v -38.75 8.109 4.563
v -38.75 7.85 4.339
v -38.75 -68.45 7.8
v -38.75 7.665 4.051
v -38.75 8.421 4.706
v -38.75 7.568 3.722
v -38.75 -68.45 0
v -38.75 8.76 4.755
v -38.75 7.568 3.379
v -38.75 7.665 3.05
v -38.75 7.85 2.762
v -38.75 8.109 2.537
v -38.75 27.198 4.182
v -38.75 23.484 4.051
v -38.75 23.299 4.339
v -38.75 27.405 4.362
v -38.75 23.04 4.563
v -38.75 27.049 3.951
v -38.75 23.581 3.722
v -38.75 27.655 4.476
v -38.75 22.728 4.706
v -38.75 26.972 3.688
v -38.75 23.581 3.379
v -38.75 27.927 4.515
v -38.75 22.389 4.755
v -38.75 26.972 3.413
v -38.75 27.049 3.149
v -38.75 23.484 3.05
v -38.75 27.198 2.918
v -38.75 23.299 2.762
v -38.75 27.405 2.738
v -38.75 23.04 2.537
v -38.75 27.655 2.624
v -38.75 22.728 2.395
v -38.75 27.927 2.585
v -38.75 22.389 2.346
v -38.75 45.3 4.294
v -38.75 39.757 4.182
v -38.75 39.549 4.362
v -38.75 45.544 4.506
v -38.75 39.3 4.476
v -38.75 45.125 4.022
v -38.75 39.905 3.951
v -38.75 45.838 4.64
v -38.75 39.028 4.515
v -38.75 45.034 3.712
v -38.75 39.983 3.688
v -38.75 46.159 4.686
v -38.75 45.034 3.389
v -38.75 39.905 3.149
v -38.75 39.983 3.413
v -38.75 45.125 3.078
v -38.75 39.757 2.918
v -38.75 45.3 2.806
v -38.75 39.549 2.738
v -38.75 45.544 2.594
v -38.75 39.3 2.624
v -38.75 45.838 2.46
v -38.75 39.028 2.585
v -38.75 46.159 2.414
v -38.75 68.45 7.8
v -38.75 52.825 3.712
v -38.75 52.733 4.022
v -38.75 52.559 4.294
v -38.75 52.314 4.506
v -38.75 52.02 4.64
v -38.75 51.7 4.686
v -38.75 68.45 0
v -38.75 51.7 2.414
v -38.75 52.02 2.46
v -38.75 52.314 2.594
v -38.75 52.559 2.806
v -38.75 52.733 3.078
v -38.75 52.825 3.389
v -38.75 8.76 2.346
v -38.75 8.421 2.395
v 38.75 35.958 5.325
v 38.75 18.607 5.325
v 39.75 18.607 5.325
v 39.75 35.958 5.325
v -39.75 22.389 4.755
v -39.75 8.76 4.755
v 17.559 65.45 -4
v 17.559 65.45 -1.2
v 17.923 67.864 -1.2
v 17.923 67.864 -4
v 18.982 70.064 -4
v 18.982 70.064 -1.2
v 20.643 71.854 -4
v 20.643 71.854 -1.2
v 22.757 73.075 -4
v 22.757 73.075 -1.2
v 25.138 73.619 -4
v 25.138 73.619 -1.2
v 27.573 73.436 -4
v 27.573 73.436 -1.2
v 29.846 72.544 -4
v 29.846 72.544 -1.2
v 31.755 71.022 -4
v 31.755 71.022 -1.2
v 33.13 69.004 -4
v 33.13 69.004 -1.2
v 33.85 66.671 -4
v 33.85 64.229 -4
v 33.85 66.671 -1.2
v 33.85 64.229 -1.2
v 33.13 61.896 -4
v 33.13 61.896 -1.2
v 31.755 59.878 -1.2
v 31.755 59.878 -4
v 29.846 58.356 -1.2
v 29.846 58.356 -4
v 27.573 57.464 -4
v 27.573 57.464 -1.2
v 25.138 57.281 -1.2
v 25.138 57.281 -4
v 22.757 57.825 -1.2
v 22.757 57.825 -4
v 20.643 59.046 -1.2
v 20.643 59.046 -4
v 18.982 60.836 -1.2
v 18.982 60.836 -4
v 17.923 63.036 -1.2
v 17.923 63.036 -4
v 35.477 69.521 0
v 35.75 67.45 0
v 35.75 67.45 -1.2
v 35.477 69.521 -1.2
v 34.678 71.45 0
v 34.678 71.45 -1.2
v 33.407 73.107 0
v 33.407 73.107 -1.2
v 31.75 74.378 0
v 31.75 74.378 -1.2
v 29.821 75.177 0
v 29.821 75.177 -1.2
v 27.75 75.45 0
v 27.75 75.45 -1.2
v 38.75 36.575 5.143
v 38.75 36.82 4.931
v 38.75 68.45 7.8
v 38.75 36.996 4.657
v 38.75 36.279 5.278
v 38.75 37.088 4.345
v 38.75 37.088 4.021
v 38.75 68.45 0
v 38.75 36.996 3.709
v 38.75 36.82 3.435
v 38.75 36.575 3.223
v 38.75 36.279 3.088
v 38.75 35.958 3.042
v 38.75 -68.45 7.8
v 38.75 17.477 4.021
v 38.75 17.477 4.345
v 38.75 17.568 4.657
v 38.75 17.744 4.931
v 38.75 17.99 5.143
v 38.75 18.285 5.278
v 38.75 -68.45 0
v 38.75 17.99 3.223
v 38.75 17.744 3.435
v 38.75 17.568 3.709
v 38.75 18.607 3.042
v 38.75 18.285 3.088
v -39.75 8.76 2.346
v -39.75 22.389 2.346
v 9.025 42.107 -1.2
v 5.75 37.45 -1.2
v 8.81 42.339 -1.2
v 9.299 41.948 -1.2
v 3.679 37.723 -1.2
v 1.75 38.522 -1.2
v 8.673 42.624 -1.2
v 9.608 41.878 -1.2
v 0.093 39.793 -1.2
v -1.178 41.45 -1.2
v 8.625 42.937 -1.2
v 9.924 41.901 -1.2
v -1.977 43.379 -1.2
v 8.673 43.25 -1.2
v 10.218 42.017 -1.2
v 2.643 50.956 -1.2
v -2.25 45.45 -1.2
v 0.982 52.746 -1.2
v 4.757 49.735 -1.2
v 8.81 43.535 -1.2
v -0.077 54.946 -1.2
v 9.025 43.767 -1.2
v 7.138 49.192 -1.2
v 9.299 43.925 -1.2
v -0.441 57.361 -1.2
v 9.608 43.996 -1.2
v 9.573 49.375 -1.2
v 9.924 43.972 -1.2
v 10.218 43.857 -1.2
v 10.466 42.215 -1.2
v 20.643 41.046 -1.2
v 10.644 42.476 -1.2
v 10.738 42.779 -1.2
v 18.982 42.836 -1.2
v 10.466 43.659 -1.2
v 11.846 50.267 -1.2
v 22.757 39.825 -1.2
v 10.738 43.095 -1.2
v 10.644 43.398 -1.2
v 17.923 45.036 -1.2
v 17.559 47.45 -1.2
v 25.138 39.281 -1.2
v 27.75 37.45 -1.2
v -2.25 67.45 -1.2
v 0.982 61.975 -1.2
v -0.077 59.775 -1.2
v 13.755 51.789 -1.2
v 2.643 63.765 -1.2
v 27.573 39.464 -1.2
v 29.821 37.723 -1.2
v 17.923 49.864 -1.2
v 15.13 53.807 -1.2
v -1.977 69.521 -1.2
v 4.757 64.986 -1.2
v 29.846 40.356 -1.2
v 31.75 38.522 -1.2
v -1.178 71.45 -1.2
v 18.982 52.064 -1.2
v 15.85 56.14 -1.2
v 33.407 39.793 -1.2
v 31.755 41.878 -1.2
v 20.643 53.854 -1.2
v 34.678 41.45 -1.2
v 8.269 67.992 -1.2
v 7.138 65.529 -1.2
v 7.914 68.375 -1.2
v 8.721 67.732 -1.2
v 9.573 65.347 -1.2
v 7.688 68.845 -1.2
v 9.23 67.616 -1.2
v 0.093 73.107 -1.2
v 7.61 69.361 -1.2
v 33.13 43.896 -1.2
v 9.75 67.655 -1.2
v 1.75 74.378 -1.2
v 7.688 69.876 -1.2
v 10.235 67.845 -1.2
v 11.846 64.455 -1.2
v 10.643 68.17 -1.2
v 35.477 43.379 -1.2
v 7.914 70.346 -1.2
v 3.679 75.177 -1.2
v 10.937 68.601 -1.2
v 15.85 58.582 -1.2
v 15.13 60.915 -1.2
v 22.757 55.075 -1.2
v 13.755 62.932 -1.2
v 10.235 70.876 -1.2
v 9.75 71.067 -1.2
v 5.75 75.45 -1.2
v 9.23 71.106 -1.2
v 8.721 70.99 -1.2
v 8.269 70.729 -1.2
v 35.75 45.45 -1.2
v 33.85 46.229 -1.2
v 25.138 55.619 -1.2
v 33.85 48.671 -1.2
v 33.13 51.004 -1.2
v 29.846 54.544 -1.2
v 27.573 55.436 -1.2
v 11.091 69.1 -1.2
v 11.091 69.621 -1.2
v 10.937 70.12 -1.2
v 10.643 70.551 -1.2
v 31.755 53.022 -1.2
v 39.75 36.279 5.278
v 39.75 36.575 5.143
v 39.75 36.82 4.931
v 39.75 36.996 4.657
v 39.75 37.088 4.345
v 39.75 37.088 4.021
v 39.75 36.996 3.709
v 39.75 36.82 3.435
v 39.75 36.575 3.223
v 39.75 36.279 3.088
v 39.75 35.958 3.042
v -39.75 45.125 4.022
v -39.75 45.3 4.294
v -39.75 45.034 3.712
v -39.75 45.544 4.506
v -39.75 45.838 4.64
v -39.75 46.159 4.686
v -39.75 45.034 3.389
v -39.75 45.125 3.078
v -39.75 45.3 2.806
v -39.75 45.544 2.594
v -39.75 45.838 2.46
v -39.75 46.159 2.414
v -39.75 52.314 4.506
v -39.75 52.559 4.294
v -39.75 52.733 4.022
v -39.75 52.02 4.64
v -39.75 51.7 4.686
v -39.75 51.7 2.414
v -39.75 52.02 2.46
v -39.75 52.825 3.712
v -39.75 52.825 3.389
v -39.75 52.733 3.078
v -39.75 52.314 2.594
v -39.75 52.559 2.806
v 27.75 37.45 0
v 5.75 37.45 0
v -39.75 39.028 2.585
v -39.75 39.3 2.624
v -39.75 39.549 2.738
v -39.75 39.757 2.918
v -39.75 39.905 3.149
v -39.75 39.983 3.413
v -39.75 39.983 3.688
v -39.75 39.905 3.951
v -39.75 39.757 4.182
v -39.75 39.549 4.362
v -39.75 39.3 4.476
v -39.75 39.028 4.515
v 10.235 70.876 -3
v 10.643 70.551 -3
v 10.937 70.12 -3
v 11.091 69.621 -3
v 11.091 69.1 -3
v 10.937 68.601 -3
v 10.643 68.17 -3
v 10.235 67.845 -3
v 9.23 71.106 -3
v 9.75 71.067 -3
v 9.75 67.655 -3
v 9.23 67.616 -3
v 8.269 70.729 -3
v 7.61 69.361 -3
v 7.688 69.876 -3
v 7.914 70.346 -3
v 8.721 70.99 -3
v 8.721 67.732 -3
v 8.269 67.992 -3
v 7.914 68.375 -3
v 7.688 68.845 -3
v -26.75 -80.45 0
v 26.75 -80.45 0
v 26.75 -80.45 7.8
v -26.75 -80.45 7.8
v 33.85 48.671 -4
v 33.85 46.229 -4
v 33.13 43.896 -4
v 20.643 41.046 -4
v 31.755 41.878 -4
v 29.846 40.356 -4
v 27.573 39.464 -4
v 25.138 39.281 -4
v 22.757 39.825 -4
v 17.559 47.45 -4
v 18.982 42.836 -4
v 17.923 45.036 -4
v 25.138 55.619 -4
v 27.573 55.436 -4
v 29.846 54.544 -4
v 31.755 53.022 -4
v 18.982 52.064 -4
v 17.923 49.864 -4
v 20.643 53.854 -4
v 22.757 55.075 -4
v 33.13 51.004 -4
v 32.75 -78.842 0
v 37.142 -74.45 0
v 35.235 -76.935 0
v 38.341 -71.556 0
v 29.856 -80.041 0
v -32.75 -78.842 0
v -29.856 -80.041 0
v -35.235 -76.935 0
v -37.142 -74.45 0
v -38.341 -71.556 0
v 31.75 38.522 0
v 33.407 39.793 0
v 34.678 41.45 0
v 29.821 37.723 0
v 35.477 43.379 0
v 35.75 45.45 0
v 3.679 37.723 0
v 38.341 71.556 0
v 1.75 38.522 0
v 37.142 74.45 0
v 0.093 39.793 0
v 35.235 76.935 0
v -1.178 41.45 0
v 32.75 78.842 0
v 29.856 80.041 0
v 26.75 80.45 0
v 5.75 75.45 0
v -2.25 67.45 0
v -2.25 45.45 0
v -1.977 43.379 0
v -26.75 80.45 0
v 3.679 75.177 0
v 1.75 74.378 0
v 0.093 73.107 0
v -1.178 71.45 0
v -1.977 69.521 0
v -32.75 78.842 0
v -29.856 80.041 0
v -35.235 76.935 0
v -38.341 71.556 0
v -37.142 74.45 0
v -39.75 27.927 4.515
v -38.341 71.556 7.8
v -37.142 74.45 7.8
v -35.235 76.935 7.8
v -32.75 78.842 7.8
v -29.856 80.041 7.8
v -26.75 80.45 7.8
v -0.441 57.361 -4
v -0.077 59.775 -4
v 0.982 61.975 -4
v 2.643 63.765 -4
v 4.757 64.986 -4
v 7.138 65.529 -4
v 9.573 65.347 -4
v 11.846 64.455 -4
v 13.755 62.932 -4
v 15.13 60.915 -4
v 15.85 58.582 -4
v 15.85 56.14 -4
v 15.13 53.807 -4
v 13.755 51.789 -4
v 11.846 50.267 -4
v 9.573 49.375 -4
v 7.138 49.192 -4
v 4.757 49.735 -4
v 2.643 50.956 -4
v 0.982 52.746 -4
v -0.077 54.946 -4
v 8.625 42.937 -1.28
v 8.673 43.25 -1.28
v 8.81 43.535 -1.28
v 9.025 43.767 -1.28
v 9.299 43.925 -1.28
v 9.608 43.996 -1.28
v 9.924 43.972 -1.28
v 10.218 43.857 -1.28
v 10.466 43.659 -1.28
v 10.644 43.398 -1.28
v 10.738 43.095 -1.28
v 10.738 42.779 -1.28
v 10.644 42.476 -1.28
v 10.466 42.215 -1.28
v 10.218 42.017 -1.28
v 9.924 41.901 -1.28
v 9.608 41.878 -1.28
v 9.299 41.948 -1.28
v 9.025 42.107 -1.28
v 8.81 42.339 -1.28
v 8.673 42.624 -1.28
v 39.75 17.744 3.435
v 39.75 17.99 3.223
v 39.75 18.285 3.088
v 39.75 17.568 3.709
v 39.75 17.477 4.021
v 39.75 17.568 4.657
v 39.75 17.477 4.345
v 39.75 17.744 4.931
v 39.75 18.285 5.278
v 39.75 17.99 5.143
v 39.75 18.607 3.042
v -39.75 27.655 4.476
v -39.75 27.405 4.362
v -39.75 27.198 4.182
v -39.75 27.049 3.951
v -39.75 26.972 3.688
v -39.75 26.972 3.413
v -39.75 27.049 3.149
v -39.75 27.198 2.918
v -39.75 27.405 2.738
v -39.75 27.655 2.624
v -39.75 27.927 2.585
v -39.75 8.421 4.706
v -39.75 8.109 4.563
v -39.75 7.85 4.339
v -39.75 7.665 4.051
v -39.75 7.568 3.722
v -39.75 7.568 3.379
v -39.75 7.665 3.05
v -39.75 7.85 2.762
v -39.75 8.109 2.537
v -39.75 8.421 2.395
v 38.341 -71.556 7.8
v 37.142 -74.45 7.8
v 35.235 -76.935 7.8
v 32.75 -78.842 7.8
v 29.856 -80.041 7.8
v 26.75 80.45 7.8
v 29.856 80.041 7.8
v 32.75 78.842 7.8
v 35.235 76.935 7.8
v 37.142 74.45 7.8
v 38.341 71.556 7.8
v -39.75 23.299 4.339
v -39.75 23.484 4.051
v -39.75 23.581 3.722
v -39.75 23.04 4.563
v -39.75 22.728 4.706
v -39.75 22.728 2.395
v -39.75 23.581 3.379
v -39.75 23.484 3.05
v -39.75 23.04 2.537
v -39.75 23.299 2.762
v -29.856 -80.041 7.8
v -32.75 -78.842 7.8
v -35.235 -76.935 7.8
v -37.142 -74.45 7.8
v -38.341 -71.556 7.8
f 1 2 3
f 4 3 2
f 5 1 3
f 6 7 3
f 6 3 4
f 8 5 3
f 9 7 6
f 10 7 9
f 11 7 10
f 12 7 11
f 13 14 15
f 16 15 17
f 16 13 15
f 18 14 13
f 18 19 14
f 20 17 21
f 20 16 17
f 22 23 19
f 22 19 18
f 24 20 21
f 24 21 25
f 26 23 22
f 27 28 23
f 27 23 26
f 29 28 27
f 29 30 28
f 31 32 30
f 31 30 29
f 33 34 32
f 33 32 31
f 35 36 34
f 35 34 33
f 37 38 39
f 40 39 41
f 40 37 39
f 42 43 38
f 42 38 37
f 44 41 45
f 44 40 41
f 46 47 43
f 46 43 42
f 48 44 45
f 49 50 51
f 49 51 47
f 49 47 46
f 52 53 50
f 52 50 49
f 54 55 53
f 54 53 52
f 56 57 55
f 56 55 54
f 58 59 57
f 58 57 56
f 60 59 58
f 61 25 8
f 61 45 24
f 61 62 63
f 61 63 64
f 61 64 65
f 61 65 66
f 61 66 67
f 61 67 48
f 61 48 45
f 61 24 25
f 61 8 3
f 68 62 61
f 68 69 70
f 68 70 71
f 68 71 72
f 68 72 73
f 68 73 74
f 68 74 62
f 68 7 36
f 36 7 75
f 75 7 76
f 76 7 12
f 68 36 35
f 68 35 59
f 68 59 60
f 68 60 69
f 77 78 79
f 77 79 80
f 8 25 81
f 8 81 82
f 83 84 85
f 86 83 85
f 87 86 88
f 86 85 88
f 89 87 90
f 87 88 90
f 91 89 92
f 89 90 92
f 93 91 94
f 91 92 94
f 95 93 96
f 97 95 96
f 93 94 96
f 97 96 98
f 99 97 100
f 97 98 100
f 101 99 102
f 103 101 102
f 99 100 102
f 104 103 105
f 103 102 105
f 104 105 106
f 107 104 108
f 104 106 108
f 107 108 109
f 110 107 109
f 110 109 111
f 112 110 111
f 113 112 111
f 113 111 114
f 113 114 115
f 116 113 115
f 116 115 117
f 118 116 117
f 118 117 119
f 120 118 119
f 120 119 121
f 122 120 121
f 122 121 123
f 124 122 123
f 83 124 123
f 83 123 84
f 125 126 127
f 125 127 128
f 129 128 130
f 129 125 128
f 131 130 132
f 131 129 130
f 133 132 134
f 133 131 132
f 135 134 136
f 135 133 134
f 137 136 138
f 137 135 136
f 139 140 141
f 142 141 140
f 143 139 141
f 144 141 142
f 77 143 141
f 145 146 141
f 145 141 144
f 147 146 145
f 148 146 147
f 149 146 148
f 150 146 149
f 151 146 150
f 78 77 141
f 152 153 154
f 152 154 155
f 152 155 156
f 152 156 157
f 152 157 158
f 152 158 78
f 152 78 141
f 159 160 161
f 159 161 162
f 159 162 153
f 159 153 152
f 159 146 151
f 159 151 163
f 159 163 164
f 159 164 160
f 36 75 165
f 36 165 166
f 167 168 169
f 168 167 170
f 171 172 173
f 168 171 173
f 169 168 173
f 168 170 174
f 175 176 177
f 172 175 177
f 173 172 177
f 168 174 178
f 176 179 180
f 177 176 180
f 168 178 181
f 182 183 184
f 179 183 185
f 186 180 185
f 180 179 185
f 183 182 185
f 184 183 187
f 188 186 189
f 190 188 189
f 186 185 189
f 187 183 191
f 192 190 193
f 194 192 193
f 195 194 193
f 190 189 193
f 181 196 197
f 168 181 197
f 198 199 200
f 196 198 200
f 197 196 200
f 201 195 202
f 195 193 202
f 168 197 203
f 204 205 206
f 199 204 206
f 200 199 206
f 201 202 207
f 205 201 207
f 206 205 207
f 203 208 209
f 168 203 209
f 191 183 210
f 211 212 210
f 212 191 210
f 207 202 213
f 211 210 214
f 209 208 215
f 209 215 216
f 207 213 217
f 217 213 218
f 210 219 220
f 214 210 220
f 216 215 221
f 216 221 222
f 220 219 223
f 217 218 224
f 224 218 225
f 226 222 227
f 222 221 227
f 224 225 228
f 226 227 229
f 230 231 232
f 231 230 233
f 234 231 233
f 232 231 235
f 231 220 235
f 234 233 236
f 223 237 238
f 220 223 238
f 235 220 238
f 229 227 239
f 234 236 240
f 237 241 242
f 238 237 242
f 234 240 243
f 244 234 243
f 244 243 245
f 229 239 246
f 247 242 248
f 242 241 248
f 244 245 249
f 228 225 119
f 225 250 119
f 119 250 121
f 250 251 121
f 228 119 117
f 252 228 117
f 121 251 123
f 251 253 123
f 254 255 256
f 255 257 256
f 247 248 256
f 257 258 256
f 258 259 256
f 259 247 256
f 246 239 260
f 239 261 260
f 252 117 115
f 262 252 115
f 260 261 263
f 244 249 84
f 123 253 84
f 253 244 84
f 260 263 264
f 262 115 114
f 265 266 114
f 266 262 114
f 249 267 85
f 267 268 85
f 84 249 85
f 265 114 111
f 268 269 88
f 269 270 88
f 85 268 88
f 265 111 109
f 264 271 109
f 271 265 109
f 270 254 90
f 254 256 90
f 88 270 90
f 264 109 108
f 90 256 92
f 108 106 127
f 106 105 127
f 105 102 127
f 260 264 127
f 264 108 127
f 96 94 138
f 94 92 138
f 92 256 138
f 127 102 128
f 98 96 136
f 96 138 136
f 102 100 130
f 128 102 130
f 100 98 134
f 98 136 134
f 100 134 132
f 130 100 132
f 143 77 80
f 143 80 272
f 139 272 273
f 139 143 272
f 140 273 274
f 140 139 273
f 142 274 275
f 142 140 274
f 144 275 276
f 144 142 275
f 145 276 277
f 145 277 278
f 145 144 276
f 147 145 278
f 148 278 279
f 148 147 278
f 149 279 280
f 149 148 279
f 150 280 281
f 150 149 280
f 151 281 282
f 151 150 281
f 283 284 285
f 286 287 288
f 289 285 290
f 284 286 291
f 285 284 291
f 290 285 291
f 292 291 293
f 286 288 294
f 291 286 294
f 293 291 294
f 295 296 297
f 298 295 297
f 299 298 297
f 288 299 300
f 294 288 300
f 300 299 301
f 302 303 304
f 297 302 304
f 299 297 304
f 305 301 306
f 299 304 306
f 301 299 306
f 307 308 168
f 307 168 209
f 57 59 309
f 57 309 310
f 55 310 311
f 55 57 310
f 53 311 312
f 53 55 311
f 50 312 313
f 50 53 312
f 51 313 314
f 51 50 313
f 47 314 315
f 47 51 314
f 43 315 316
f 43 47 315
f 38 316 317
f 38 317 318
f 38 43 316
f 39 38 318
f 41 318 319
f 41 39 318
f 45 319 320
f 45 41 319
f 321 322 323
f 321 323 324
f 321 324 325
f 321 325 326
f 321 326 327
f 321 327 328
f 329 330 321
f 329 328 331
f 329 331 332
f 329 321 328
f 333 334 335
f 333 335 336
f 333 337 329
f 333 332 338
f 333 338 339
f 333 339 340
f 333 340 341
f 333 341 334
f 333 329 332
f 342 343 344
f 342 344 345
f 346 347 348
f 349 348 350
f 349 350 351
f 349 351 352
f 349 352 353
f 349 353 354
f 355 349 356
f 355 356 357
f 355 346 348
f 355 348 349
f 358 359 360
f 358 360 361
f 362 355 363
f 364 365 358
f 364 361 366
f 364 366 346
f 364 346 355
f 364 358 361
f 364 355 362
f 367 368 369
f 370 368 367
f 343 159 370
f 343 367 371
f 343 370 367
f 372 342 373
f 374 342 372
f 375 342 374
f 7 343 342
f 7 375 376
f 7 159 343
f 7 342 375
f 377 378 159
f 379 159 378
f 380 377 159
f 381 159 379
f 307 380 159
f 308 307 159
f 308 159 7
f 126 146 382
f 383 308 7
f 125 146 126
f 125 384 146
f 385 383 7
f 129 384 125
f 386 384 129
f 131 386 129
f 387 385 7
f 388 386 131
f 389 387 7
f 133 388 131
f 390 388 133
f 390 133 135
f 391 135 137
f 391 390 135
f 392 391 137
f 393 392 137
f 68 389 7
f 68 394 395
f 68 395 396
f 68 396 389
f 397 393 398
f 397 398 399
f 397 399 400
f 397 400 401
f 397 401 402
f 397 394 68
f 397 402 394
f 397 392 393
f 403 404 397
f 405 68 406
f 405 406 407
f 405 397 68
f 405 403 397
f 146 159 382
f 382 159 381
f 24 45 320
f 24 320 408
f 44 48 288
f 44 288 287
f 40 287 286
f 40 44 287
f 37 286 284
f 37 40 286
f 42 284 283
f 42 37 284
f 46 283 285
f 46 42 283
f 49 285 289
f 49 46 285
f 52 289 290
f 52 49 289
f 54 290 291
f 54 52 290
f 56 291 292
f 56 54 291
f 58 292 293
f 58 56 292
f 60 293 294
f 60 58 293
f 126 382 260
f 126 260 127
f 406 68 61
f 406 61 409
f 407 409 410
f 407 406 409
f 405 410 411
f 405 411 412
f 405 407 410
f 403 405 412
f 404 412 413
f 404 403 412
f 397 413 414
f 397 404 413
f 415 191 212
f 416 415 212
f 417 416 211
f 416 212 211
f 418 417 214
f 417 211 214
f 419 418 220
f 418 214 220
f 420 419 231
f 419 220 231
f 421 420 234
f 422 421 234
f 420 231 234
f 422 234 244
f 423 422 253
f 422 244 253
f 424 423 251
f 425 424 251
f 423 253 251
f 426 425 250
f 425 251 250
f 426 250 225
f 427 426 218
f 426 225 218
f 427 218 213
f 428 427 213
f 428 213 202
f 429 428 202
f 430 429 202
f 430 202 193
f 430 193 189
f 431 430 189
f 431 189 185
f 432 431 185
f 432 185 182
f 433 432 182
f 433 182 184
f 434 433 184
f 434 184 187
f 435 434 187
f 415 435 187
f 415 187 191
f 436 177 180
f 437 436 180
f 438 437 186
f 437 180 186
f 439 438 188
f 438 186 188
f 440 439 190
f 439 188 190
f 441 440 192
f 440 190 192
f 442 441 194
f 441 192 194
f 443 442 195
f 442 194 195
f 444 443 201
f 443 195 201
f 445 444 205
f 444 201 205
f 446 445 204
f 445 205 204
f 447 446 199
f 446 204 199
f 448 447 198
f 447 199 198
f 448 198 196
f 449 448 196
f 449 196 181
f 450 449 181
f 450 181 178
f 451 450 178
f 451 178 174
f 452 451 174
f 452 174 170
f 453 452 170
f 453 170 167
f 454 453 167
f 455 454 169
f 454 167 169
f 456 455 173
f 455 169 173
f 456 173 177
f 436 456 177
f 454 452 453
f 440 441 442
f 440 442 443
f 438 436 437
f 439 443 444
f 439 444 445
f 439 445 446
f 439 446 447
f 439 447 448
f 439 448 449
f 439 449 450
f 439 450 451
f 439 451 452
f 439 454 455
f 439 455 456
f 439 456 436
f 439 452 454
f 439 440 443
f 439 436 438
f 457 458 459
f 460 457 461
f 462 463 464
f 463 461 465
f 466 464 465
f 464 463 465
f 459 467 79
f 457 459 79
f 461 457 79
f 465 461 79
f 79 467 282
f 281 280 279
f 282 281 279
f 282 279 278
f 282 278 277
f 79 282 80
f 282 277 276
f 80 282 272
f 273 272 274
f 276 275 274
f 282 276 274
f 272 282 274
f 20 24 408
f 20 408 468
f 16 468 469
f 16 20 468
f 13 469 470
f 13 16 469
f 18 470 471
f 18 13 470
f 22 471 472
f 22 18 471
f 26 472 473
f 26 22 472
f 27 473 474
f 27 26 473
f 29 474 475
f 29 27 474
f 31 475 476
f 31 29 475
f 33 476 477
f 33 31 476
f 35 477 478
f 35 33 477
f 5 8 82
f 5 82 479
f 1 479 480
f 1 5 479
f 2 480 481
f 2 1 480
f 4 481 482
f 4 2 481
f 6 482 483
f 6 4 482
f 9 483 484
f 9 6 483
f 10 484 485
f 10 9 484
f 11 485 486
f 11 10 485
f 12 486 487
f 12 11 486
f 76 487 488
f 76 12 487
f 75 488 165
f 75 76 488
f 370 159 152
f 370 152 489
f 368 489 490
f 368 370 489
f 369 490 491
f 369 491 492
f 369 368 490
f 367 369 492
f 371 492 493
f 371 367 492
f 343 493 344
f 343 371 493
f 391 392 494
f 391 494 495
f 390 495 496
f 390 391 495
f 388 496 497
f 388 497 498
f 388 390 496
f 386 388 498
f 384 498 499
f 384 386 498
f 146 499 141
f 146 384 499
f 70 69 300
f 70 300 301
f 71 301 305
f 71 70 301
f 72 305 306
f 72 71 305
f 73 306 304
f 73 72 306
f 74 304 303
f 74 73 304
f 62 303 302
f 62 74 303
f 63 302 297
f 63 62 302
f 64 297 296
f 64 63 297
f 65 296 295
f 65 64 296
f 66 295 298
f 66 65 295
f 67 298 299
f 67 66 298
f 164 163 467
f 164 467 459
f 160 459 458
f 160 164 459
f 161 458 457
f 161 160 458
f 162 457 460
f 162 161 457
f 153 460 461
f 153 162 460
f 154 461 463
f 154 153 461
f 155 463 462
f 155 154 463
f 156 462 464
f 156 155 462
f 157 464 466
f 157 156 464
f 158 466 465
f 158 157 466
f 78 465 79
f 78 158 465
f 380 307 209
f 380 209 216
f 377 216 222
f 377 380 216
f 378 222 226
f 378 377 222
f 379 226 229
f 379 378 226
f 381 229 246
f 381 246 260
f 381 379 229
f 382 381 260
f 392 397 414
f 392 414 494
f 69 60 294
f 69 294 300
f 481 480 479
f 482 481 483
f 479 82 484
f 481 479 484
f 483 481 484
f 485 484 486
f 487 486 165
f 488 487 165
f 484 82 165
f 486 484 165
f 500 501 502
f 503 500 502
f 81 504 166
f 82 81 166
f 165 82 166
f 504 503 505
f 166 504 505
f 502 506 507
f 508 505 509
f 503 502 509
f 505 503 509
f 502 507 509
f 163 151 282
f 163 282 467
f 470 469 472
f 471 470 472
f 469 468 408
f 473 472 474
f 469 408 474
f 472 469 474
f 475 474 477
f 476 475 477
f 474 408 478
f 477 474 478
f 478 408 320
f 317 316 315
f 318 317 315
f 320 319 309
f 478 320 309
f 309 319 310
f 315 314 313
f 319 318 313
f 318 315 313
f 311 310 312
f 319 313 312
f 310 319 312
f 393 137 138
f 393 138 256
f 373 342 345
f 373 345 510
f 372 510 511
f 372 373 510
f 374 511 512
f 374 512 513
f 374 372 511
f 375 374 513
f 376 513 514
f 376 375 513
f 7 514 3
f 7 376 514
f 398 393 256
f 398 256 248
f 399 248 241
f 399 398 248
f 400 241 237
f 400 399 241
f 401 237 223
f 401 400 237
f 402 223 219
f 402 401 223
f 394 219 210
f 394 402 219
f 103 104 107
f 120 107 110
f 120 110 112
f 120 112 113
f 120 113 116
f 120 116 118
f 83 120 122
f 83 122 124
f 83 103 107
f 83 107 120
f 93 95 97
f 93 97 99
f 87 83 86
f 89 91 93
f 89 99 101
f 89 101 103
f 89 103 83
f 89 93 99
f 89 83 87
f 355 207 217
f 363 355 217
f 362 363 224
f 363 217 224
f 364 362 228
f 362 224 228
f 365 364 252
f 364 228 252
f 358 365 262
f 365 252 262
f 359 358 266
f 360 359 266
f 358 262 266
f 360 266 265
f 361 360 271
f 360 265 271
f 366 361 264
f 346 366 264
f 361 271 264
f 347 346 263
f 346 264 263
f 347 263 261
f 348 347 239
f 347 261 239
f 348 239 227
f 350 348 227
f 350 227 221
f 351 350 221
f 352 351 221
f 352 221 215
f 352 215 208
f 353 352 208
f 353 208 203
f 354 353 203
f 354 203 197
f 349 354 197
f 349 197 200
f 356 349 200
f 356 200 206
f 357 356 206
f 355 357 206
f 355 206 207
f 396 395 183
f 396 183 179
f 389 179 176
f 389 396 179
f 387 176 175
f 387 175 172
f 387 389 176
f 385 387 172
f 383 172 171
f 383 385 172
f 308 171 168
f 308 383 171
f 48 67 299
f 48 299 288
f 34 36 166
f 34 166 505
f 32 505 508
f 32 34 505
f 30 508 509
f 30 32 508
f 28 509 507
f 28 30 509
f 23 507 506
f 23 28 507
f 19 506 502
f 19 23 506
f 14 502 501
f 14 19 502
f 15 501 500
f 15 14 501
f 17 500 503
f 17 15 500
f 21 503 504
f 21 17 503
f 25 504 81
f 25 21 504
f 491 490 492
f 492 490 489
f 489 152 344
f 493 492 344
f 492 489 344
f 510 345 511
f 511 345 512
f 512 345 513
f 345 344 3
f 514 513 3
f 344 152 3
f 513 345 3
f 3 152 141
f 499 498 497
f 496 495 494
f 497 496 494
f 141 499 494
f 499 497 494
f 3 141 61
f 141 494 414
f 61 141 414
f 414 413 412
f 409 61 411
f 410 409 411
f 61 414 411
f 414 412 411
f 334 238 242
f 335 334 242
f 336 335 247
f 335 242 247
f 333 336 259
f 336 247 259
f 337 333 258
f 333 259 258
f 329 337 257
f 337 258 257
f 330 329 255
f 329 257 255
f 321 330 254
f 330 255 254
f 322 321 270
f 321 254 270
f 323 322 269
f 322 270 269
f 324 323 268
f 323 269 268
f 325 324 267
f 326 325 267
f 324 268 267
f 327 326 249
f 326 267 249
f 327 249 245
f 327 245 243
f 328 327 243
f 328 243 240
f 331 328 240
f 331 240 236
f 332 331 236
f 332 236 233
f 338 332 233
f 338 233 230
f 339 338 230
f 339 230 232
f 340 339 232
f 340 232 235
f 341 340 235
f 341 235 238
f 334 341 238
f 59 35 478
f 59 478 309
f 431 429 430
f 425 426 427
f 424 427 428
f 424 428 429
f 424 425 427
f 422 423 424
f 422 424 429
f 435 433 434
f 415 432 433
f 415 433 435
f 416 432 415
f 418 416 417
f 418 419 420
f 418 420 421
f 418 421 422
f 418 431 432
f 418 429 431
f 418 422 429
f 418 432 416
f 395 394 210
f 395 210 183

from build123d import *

# Parameters (mm, degrees)
EXTRUDE_1_DEPTH  = 7.8
EXTRUDE_3_DEPTH  = 1.2
SKETCH_9_4_R     = 8.191420507
EXTRUDE_4_DEPTH  = 4
SKETCH_9_5_R     = 1.750016101
EXTRUDE_5_DEPTH  = 3
EXTRUDE_7_DEPTH  = 1
EXTRUDE_8_DEPTH  = 1
EXTRUDE_9_DEPTH  = 1
SKETCH_11_R      = 1.061990405
EXTRUDE_10_DEPTH = 0.08


with BuildPart() as part:
    # 草图1 → 凸台-拉伸1 (new body)
    with BuildSketch(Plane.XY):
        with BuildLine():
            Line((26.75, -80.45), (-26.75, -80.45))
            ThreePointArc((-26.75, -80.45), (-35.235281374, -76.935281374), (-38.75, -68.45))
            Line((-38.75, -68.45), (-38.75, 68.45))
            ThreePointArc((-38.75, 68.45), (-35.235281374, 76.935281374), (-26.75, 80.45))
            Line((-26.75, 80.45), (26.75, 80.45))
            ThreePointArc((26.75, 80.45), (35.235281374, 76.935281374), (38.75, 68.45))
            Line((38.75, 68.45), (38.75, -68.45))
            ThreePointArc((38.75, -68.45), (35.235281374, -76.935281374), (26.75, -80.45))
        make_face()
    extrude(amount=EXTRUDE_1_DEPTH)

    # 草图9 → 凸台-拉伸3 (add)
    with BuildSketch(Plane(origin=(0, 0, 0), x_dir=(-1, 0, 0), z_dir=(0, 0, -1))):
        with BuildLine():
            Line((-27.75, 75.45), (-5.75, 75.45))
            ThreePointArc((-5.75, 75.45), (-0.093145751, 73.106854249), (2.25, 67.45))
            Line((2.25, 67.45), (2.25, 45.45))
            ThreePointArc((2.25, 45.45), (-0.093145751, 39.793145751), (-5.75, 37.45))
            Line((-5.75, 37.45), (-27.75, 37.45))
            ThreePointArc((-27.75, 37.45), (-33.406854249, 39.793145751), (-35.75, 45.45))
            Line((-35.75, 45.45), (-35.75, 67.45))
            ThreePointArc((-35.75, 67.45), (-33.406854249, 73.106854249), (-27.75, 75.45))
        make_face()
    extrude(amount=EXTRUDE_3_DEPTH)

    # 草图9<4> → 凸台-拉伸4 (add)
    with BuildSketch(Plane(origin=(0, 0, 0), x_dir=(-1, 0, 0), z_dir=(0, 0, -1))):
        with Locations((-25.75, 65.45)):
            Circle(SKETCH_9_4_R)
        with Locations((-7.75, 57.360656258)):
            Circle(SKETCH_9_4_R)
        with Locations((-25.75, 47.45)):
            Circle(SKETCH_9_4_R)
    extrude(amount=EXTRUDE_4_DEPTH)

    # 草图9<5> → 凸台-拉伸5 (add)
    with BuildSketch(Plane(origin=(0, 0, 0), x_dir=(-1, 0, 0), z_dir=(0, 0, -1))):
        with Locations((-9.360421126, 69.360656258)):
            Circle(SKETCH_9_5_R)
    extrude(amount=EXTRUDE_5_DEPTH)

    # 草图12 → 凸台-拉伸7 (add)
    with BuildSketch(Plane.ZY.offset(38.75)):
        with BuildLine():
            Line((4.686466023, 51.699871834), (4.686466023, 46.158543385))
            ThreePointArc((4.686466023, 46.158543385), (3.550247732, 45.022325093), (2.41402944, 46.158543385))
            Line((2.41402944, 46.158543385), (2.41402944, 51.699871834))
            ThreePointArc((2.41402944, 51.699871834), (3.550247732, 52.836090125), (4.686466023, 51.699871834))
        make_face()
    extrude(amount=EXTRUDE_7_DEPTH)

    # 草图12<3> → 凸台-拉伸8 (add)
    with BuildSketch(Plane.ZY.offset(38.75)):
        with BuildLine():
            Line((4.686466023, 51.699871834), (4.686466023, 46.158543385))
            ThreePointArc((4.686466023, 46.158543385), (3.550247732, 45.022325093), (2.41402944, 46.158543385))
            Line((2.41402944, 46.158543385), (2.41402944, 51.699871834))
            ThreePointArc((2.41402944, 51.699871834), (3.550247732, 52.836090125), (4.686466023, 51.699871834))
        make_face()
        with BuildLine():
            Line((2.585183967, 27.92697733), (2.585183967, 39.027618957))
            ThreePointArc((2.585183967, 39.027618957), (3.550247732, 39.992682722), (4.515311496, 39.027618957))
            Line((4.515311496, 39.027618957), (4.515311496, 27.92697733))
            ThreePointArc((4.515311496, 27.92697733), (3.550247732, 26.961913565), (2.585183967, 27.92697733))
        make_face()
        with BuildLine():
            Line((2.34585079, 8.760131584), (2.34585079, 22.388503734))
            ThreePointArc((2.34585079, 22.388503734), (3.550247732, 23.592900676), (4.754644674, 22.388503734))
            Line((4.754644674, 22.388503734), (4.754644674, 8.760131584))
            ThreePointArc((4.754644674, 8.760131584), (3.550247732, 7.555734642), (2.34585079, 8.760131584))
        make_face()
    extrude(amount=EXTRUDE_8_DEPTH)

    # 草图13 → 凸台-拉伸9 (add)
    with BuildSketch(Plane(origin=(38.75, 0, 0), x_dir=(0, 0, -1), z_dir=(1, 0, 0))):
        with BuildLine():
            Line((-3.041514771, 35.957715301), (-3.041514771, 18.606690775))
            ThreePointArc((-3.041514771, 18.606690775), (-4.183029543, 17.465176003), (-5.324544314, 18.606690775))
            Line((-5.324544314, 18.606690775), (-5.324544314, 35.957715301))
            ThreePointArc((-5.324544314, 35.957715301), (-4.183029543, 37.099230072), (-3.041514771, 35.957715301))
        make_face()
    extrude(amount=EXTRUDE_9_DEPTH)

    # 草图11 → 凸台-拉伸10 (add)
    with BuildSketch(Plane(origin=(0, 0, -1.2), x_dir=(-1, 0, 0), z_dir=(0, 0, -1))):
        with Locations((-9.68745595, 42.936842594)):
            Circle(SKETCH_11_R)
    extrude(amount=EXTRUDE_10_DEPTH)


solid = part.part
